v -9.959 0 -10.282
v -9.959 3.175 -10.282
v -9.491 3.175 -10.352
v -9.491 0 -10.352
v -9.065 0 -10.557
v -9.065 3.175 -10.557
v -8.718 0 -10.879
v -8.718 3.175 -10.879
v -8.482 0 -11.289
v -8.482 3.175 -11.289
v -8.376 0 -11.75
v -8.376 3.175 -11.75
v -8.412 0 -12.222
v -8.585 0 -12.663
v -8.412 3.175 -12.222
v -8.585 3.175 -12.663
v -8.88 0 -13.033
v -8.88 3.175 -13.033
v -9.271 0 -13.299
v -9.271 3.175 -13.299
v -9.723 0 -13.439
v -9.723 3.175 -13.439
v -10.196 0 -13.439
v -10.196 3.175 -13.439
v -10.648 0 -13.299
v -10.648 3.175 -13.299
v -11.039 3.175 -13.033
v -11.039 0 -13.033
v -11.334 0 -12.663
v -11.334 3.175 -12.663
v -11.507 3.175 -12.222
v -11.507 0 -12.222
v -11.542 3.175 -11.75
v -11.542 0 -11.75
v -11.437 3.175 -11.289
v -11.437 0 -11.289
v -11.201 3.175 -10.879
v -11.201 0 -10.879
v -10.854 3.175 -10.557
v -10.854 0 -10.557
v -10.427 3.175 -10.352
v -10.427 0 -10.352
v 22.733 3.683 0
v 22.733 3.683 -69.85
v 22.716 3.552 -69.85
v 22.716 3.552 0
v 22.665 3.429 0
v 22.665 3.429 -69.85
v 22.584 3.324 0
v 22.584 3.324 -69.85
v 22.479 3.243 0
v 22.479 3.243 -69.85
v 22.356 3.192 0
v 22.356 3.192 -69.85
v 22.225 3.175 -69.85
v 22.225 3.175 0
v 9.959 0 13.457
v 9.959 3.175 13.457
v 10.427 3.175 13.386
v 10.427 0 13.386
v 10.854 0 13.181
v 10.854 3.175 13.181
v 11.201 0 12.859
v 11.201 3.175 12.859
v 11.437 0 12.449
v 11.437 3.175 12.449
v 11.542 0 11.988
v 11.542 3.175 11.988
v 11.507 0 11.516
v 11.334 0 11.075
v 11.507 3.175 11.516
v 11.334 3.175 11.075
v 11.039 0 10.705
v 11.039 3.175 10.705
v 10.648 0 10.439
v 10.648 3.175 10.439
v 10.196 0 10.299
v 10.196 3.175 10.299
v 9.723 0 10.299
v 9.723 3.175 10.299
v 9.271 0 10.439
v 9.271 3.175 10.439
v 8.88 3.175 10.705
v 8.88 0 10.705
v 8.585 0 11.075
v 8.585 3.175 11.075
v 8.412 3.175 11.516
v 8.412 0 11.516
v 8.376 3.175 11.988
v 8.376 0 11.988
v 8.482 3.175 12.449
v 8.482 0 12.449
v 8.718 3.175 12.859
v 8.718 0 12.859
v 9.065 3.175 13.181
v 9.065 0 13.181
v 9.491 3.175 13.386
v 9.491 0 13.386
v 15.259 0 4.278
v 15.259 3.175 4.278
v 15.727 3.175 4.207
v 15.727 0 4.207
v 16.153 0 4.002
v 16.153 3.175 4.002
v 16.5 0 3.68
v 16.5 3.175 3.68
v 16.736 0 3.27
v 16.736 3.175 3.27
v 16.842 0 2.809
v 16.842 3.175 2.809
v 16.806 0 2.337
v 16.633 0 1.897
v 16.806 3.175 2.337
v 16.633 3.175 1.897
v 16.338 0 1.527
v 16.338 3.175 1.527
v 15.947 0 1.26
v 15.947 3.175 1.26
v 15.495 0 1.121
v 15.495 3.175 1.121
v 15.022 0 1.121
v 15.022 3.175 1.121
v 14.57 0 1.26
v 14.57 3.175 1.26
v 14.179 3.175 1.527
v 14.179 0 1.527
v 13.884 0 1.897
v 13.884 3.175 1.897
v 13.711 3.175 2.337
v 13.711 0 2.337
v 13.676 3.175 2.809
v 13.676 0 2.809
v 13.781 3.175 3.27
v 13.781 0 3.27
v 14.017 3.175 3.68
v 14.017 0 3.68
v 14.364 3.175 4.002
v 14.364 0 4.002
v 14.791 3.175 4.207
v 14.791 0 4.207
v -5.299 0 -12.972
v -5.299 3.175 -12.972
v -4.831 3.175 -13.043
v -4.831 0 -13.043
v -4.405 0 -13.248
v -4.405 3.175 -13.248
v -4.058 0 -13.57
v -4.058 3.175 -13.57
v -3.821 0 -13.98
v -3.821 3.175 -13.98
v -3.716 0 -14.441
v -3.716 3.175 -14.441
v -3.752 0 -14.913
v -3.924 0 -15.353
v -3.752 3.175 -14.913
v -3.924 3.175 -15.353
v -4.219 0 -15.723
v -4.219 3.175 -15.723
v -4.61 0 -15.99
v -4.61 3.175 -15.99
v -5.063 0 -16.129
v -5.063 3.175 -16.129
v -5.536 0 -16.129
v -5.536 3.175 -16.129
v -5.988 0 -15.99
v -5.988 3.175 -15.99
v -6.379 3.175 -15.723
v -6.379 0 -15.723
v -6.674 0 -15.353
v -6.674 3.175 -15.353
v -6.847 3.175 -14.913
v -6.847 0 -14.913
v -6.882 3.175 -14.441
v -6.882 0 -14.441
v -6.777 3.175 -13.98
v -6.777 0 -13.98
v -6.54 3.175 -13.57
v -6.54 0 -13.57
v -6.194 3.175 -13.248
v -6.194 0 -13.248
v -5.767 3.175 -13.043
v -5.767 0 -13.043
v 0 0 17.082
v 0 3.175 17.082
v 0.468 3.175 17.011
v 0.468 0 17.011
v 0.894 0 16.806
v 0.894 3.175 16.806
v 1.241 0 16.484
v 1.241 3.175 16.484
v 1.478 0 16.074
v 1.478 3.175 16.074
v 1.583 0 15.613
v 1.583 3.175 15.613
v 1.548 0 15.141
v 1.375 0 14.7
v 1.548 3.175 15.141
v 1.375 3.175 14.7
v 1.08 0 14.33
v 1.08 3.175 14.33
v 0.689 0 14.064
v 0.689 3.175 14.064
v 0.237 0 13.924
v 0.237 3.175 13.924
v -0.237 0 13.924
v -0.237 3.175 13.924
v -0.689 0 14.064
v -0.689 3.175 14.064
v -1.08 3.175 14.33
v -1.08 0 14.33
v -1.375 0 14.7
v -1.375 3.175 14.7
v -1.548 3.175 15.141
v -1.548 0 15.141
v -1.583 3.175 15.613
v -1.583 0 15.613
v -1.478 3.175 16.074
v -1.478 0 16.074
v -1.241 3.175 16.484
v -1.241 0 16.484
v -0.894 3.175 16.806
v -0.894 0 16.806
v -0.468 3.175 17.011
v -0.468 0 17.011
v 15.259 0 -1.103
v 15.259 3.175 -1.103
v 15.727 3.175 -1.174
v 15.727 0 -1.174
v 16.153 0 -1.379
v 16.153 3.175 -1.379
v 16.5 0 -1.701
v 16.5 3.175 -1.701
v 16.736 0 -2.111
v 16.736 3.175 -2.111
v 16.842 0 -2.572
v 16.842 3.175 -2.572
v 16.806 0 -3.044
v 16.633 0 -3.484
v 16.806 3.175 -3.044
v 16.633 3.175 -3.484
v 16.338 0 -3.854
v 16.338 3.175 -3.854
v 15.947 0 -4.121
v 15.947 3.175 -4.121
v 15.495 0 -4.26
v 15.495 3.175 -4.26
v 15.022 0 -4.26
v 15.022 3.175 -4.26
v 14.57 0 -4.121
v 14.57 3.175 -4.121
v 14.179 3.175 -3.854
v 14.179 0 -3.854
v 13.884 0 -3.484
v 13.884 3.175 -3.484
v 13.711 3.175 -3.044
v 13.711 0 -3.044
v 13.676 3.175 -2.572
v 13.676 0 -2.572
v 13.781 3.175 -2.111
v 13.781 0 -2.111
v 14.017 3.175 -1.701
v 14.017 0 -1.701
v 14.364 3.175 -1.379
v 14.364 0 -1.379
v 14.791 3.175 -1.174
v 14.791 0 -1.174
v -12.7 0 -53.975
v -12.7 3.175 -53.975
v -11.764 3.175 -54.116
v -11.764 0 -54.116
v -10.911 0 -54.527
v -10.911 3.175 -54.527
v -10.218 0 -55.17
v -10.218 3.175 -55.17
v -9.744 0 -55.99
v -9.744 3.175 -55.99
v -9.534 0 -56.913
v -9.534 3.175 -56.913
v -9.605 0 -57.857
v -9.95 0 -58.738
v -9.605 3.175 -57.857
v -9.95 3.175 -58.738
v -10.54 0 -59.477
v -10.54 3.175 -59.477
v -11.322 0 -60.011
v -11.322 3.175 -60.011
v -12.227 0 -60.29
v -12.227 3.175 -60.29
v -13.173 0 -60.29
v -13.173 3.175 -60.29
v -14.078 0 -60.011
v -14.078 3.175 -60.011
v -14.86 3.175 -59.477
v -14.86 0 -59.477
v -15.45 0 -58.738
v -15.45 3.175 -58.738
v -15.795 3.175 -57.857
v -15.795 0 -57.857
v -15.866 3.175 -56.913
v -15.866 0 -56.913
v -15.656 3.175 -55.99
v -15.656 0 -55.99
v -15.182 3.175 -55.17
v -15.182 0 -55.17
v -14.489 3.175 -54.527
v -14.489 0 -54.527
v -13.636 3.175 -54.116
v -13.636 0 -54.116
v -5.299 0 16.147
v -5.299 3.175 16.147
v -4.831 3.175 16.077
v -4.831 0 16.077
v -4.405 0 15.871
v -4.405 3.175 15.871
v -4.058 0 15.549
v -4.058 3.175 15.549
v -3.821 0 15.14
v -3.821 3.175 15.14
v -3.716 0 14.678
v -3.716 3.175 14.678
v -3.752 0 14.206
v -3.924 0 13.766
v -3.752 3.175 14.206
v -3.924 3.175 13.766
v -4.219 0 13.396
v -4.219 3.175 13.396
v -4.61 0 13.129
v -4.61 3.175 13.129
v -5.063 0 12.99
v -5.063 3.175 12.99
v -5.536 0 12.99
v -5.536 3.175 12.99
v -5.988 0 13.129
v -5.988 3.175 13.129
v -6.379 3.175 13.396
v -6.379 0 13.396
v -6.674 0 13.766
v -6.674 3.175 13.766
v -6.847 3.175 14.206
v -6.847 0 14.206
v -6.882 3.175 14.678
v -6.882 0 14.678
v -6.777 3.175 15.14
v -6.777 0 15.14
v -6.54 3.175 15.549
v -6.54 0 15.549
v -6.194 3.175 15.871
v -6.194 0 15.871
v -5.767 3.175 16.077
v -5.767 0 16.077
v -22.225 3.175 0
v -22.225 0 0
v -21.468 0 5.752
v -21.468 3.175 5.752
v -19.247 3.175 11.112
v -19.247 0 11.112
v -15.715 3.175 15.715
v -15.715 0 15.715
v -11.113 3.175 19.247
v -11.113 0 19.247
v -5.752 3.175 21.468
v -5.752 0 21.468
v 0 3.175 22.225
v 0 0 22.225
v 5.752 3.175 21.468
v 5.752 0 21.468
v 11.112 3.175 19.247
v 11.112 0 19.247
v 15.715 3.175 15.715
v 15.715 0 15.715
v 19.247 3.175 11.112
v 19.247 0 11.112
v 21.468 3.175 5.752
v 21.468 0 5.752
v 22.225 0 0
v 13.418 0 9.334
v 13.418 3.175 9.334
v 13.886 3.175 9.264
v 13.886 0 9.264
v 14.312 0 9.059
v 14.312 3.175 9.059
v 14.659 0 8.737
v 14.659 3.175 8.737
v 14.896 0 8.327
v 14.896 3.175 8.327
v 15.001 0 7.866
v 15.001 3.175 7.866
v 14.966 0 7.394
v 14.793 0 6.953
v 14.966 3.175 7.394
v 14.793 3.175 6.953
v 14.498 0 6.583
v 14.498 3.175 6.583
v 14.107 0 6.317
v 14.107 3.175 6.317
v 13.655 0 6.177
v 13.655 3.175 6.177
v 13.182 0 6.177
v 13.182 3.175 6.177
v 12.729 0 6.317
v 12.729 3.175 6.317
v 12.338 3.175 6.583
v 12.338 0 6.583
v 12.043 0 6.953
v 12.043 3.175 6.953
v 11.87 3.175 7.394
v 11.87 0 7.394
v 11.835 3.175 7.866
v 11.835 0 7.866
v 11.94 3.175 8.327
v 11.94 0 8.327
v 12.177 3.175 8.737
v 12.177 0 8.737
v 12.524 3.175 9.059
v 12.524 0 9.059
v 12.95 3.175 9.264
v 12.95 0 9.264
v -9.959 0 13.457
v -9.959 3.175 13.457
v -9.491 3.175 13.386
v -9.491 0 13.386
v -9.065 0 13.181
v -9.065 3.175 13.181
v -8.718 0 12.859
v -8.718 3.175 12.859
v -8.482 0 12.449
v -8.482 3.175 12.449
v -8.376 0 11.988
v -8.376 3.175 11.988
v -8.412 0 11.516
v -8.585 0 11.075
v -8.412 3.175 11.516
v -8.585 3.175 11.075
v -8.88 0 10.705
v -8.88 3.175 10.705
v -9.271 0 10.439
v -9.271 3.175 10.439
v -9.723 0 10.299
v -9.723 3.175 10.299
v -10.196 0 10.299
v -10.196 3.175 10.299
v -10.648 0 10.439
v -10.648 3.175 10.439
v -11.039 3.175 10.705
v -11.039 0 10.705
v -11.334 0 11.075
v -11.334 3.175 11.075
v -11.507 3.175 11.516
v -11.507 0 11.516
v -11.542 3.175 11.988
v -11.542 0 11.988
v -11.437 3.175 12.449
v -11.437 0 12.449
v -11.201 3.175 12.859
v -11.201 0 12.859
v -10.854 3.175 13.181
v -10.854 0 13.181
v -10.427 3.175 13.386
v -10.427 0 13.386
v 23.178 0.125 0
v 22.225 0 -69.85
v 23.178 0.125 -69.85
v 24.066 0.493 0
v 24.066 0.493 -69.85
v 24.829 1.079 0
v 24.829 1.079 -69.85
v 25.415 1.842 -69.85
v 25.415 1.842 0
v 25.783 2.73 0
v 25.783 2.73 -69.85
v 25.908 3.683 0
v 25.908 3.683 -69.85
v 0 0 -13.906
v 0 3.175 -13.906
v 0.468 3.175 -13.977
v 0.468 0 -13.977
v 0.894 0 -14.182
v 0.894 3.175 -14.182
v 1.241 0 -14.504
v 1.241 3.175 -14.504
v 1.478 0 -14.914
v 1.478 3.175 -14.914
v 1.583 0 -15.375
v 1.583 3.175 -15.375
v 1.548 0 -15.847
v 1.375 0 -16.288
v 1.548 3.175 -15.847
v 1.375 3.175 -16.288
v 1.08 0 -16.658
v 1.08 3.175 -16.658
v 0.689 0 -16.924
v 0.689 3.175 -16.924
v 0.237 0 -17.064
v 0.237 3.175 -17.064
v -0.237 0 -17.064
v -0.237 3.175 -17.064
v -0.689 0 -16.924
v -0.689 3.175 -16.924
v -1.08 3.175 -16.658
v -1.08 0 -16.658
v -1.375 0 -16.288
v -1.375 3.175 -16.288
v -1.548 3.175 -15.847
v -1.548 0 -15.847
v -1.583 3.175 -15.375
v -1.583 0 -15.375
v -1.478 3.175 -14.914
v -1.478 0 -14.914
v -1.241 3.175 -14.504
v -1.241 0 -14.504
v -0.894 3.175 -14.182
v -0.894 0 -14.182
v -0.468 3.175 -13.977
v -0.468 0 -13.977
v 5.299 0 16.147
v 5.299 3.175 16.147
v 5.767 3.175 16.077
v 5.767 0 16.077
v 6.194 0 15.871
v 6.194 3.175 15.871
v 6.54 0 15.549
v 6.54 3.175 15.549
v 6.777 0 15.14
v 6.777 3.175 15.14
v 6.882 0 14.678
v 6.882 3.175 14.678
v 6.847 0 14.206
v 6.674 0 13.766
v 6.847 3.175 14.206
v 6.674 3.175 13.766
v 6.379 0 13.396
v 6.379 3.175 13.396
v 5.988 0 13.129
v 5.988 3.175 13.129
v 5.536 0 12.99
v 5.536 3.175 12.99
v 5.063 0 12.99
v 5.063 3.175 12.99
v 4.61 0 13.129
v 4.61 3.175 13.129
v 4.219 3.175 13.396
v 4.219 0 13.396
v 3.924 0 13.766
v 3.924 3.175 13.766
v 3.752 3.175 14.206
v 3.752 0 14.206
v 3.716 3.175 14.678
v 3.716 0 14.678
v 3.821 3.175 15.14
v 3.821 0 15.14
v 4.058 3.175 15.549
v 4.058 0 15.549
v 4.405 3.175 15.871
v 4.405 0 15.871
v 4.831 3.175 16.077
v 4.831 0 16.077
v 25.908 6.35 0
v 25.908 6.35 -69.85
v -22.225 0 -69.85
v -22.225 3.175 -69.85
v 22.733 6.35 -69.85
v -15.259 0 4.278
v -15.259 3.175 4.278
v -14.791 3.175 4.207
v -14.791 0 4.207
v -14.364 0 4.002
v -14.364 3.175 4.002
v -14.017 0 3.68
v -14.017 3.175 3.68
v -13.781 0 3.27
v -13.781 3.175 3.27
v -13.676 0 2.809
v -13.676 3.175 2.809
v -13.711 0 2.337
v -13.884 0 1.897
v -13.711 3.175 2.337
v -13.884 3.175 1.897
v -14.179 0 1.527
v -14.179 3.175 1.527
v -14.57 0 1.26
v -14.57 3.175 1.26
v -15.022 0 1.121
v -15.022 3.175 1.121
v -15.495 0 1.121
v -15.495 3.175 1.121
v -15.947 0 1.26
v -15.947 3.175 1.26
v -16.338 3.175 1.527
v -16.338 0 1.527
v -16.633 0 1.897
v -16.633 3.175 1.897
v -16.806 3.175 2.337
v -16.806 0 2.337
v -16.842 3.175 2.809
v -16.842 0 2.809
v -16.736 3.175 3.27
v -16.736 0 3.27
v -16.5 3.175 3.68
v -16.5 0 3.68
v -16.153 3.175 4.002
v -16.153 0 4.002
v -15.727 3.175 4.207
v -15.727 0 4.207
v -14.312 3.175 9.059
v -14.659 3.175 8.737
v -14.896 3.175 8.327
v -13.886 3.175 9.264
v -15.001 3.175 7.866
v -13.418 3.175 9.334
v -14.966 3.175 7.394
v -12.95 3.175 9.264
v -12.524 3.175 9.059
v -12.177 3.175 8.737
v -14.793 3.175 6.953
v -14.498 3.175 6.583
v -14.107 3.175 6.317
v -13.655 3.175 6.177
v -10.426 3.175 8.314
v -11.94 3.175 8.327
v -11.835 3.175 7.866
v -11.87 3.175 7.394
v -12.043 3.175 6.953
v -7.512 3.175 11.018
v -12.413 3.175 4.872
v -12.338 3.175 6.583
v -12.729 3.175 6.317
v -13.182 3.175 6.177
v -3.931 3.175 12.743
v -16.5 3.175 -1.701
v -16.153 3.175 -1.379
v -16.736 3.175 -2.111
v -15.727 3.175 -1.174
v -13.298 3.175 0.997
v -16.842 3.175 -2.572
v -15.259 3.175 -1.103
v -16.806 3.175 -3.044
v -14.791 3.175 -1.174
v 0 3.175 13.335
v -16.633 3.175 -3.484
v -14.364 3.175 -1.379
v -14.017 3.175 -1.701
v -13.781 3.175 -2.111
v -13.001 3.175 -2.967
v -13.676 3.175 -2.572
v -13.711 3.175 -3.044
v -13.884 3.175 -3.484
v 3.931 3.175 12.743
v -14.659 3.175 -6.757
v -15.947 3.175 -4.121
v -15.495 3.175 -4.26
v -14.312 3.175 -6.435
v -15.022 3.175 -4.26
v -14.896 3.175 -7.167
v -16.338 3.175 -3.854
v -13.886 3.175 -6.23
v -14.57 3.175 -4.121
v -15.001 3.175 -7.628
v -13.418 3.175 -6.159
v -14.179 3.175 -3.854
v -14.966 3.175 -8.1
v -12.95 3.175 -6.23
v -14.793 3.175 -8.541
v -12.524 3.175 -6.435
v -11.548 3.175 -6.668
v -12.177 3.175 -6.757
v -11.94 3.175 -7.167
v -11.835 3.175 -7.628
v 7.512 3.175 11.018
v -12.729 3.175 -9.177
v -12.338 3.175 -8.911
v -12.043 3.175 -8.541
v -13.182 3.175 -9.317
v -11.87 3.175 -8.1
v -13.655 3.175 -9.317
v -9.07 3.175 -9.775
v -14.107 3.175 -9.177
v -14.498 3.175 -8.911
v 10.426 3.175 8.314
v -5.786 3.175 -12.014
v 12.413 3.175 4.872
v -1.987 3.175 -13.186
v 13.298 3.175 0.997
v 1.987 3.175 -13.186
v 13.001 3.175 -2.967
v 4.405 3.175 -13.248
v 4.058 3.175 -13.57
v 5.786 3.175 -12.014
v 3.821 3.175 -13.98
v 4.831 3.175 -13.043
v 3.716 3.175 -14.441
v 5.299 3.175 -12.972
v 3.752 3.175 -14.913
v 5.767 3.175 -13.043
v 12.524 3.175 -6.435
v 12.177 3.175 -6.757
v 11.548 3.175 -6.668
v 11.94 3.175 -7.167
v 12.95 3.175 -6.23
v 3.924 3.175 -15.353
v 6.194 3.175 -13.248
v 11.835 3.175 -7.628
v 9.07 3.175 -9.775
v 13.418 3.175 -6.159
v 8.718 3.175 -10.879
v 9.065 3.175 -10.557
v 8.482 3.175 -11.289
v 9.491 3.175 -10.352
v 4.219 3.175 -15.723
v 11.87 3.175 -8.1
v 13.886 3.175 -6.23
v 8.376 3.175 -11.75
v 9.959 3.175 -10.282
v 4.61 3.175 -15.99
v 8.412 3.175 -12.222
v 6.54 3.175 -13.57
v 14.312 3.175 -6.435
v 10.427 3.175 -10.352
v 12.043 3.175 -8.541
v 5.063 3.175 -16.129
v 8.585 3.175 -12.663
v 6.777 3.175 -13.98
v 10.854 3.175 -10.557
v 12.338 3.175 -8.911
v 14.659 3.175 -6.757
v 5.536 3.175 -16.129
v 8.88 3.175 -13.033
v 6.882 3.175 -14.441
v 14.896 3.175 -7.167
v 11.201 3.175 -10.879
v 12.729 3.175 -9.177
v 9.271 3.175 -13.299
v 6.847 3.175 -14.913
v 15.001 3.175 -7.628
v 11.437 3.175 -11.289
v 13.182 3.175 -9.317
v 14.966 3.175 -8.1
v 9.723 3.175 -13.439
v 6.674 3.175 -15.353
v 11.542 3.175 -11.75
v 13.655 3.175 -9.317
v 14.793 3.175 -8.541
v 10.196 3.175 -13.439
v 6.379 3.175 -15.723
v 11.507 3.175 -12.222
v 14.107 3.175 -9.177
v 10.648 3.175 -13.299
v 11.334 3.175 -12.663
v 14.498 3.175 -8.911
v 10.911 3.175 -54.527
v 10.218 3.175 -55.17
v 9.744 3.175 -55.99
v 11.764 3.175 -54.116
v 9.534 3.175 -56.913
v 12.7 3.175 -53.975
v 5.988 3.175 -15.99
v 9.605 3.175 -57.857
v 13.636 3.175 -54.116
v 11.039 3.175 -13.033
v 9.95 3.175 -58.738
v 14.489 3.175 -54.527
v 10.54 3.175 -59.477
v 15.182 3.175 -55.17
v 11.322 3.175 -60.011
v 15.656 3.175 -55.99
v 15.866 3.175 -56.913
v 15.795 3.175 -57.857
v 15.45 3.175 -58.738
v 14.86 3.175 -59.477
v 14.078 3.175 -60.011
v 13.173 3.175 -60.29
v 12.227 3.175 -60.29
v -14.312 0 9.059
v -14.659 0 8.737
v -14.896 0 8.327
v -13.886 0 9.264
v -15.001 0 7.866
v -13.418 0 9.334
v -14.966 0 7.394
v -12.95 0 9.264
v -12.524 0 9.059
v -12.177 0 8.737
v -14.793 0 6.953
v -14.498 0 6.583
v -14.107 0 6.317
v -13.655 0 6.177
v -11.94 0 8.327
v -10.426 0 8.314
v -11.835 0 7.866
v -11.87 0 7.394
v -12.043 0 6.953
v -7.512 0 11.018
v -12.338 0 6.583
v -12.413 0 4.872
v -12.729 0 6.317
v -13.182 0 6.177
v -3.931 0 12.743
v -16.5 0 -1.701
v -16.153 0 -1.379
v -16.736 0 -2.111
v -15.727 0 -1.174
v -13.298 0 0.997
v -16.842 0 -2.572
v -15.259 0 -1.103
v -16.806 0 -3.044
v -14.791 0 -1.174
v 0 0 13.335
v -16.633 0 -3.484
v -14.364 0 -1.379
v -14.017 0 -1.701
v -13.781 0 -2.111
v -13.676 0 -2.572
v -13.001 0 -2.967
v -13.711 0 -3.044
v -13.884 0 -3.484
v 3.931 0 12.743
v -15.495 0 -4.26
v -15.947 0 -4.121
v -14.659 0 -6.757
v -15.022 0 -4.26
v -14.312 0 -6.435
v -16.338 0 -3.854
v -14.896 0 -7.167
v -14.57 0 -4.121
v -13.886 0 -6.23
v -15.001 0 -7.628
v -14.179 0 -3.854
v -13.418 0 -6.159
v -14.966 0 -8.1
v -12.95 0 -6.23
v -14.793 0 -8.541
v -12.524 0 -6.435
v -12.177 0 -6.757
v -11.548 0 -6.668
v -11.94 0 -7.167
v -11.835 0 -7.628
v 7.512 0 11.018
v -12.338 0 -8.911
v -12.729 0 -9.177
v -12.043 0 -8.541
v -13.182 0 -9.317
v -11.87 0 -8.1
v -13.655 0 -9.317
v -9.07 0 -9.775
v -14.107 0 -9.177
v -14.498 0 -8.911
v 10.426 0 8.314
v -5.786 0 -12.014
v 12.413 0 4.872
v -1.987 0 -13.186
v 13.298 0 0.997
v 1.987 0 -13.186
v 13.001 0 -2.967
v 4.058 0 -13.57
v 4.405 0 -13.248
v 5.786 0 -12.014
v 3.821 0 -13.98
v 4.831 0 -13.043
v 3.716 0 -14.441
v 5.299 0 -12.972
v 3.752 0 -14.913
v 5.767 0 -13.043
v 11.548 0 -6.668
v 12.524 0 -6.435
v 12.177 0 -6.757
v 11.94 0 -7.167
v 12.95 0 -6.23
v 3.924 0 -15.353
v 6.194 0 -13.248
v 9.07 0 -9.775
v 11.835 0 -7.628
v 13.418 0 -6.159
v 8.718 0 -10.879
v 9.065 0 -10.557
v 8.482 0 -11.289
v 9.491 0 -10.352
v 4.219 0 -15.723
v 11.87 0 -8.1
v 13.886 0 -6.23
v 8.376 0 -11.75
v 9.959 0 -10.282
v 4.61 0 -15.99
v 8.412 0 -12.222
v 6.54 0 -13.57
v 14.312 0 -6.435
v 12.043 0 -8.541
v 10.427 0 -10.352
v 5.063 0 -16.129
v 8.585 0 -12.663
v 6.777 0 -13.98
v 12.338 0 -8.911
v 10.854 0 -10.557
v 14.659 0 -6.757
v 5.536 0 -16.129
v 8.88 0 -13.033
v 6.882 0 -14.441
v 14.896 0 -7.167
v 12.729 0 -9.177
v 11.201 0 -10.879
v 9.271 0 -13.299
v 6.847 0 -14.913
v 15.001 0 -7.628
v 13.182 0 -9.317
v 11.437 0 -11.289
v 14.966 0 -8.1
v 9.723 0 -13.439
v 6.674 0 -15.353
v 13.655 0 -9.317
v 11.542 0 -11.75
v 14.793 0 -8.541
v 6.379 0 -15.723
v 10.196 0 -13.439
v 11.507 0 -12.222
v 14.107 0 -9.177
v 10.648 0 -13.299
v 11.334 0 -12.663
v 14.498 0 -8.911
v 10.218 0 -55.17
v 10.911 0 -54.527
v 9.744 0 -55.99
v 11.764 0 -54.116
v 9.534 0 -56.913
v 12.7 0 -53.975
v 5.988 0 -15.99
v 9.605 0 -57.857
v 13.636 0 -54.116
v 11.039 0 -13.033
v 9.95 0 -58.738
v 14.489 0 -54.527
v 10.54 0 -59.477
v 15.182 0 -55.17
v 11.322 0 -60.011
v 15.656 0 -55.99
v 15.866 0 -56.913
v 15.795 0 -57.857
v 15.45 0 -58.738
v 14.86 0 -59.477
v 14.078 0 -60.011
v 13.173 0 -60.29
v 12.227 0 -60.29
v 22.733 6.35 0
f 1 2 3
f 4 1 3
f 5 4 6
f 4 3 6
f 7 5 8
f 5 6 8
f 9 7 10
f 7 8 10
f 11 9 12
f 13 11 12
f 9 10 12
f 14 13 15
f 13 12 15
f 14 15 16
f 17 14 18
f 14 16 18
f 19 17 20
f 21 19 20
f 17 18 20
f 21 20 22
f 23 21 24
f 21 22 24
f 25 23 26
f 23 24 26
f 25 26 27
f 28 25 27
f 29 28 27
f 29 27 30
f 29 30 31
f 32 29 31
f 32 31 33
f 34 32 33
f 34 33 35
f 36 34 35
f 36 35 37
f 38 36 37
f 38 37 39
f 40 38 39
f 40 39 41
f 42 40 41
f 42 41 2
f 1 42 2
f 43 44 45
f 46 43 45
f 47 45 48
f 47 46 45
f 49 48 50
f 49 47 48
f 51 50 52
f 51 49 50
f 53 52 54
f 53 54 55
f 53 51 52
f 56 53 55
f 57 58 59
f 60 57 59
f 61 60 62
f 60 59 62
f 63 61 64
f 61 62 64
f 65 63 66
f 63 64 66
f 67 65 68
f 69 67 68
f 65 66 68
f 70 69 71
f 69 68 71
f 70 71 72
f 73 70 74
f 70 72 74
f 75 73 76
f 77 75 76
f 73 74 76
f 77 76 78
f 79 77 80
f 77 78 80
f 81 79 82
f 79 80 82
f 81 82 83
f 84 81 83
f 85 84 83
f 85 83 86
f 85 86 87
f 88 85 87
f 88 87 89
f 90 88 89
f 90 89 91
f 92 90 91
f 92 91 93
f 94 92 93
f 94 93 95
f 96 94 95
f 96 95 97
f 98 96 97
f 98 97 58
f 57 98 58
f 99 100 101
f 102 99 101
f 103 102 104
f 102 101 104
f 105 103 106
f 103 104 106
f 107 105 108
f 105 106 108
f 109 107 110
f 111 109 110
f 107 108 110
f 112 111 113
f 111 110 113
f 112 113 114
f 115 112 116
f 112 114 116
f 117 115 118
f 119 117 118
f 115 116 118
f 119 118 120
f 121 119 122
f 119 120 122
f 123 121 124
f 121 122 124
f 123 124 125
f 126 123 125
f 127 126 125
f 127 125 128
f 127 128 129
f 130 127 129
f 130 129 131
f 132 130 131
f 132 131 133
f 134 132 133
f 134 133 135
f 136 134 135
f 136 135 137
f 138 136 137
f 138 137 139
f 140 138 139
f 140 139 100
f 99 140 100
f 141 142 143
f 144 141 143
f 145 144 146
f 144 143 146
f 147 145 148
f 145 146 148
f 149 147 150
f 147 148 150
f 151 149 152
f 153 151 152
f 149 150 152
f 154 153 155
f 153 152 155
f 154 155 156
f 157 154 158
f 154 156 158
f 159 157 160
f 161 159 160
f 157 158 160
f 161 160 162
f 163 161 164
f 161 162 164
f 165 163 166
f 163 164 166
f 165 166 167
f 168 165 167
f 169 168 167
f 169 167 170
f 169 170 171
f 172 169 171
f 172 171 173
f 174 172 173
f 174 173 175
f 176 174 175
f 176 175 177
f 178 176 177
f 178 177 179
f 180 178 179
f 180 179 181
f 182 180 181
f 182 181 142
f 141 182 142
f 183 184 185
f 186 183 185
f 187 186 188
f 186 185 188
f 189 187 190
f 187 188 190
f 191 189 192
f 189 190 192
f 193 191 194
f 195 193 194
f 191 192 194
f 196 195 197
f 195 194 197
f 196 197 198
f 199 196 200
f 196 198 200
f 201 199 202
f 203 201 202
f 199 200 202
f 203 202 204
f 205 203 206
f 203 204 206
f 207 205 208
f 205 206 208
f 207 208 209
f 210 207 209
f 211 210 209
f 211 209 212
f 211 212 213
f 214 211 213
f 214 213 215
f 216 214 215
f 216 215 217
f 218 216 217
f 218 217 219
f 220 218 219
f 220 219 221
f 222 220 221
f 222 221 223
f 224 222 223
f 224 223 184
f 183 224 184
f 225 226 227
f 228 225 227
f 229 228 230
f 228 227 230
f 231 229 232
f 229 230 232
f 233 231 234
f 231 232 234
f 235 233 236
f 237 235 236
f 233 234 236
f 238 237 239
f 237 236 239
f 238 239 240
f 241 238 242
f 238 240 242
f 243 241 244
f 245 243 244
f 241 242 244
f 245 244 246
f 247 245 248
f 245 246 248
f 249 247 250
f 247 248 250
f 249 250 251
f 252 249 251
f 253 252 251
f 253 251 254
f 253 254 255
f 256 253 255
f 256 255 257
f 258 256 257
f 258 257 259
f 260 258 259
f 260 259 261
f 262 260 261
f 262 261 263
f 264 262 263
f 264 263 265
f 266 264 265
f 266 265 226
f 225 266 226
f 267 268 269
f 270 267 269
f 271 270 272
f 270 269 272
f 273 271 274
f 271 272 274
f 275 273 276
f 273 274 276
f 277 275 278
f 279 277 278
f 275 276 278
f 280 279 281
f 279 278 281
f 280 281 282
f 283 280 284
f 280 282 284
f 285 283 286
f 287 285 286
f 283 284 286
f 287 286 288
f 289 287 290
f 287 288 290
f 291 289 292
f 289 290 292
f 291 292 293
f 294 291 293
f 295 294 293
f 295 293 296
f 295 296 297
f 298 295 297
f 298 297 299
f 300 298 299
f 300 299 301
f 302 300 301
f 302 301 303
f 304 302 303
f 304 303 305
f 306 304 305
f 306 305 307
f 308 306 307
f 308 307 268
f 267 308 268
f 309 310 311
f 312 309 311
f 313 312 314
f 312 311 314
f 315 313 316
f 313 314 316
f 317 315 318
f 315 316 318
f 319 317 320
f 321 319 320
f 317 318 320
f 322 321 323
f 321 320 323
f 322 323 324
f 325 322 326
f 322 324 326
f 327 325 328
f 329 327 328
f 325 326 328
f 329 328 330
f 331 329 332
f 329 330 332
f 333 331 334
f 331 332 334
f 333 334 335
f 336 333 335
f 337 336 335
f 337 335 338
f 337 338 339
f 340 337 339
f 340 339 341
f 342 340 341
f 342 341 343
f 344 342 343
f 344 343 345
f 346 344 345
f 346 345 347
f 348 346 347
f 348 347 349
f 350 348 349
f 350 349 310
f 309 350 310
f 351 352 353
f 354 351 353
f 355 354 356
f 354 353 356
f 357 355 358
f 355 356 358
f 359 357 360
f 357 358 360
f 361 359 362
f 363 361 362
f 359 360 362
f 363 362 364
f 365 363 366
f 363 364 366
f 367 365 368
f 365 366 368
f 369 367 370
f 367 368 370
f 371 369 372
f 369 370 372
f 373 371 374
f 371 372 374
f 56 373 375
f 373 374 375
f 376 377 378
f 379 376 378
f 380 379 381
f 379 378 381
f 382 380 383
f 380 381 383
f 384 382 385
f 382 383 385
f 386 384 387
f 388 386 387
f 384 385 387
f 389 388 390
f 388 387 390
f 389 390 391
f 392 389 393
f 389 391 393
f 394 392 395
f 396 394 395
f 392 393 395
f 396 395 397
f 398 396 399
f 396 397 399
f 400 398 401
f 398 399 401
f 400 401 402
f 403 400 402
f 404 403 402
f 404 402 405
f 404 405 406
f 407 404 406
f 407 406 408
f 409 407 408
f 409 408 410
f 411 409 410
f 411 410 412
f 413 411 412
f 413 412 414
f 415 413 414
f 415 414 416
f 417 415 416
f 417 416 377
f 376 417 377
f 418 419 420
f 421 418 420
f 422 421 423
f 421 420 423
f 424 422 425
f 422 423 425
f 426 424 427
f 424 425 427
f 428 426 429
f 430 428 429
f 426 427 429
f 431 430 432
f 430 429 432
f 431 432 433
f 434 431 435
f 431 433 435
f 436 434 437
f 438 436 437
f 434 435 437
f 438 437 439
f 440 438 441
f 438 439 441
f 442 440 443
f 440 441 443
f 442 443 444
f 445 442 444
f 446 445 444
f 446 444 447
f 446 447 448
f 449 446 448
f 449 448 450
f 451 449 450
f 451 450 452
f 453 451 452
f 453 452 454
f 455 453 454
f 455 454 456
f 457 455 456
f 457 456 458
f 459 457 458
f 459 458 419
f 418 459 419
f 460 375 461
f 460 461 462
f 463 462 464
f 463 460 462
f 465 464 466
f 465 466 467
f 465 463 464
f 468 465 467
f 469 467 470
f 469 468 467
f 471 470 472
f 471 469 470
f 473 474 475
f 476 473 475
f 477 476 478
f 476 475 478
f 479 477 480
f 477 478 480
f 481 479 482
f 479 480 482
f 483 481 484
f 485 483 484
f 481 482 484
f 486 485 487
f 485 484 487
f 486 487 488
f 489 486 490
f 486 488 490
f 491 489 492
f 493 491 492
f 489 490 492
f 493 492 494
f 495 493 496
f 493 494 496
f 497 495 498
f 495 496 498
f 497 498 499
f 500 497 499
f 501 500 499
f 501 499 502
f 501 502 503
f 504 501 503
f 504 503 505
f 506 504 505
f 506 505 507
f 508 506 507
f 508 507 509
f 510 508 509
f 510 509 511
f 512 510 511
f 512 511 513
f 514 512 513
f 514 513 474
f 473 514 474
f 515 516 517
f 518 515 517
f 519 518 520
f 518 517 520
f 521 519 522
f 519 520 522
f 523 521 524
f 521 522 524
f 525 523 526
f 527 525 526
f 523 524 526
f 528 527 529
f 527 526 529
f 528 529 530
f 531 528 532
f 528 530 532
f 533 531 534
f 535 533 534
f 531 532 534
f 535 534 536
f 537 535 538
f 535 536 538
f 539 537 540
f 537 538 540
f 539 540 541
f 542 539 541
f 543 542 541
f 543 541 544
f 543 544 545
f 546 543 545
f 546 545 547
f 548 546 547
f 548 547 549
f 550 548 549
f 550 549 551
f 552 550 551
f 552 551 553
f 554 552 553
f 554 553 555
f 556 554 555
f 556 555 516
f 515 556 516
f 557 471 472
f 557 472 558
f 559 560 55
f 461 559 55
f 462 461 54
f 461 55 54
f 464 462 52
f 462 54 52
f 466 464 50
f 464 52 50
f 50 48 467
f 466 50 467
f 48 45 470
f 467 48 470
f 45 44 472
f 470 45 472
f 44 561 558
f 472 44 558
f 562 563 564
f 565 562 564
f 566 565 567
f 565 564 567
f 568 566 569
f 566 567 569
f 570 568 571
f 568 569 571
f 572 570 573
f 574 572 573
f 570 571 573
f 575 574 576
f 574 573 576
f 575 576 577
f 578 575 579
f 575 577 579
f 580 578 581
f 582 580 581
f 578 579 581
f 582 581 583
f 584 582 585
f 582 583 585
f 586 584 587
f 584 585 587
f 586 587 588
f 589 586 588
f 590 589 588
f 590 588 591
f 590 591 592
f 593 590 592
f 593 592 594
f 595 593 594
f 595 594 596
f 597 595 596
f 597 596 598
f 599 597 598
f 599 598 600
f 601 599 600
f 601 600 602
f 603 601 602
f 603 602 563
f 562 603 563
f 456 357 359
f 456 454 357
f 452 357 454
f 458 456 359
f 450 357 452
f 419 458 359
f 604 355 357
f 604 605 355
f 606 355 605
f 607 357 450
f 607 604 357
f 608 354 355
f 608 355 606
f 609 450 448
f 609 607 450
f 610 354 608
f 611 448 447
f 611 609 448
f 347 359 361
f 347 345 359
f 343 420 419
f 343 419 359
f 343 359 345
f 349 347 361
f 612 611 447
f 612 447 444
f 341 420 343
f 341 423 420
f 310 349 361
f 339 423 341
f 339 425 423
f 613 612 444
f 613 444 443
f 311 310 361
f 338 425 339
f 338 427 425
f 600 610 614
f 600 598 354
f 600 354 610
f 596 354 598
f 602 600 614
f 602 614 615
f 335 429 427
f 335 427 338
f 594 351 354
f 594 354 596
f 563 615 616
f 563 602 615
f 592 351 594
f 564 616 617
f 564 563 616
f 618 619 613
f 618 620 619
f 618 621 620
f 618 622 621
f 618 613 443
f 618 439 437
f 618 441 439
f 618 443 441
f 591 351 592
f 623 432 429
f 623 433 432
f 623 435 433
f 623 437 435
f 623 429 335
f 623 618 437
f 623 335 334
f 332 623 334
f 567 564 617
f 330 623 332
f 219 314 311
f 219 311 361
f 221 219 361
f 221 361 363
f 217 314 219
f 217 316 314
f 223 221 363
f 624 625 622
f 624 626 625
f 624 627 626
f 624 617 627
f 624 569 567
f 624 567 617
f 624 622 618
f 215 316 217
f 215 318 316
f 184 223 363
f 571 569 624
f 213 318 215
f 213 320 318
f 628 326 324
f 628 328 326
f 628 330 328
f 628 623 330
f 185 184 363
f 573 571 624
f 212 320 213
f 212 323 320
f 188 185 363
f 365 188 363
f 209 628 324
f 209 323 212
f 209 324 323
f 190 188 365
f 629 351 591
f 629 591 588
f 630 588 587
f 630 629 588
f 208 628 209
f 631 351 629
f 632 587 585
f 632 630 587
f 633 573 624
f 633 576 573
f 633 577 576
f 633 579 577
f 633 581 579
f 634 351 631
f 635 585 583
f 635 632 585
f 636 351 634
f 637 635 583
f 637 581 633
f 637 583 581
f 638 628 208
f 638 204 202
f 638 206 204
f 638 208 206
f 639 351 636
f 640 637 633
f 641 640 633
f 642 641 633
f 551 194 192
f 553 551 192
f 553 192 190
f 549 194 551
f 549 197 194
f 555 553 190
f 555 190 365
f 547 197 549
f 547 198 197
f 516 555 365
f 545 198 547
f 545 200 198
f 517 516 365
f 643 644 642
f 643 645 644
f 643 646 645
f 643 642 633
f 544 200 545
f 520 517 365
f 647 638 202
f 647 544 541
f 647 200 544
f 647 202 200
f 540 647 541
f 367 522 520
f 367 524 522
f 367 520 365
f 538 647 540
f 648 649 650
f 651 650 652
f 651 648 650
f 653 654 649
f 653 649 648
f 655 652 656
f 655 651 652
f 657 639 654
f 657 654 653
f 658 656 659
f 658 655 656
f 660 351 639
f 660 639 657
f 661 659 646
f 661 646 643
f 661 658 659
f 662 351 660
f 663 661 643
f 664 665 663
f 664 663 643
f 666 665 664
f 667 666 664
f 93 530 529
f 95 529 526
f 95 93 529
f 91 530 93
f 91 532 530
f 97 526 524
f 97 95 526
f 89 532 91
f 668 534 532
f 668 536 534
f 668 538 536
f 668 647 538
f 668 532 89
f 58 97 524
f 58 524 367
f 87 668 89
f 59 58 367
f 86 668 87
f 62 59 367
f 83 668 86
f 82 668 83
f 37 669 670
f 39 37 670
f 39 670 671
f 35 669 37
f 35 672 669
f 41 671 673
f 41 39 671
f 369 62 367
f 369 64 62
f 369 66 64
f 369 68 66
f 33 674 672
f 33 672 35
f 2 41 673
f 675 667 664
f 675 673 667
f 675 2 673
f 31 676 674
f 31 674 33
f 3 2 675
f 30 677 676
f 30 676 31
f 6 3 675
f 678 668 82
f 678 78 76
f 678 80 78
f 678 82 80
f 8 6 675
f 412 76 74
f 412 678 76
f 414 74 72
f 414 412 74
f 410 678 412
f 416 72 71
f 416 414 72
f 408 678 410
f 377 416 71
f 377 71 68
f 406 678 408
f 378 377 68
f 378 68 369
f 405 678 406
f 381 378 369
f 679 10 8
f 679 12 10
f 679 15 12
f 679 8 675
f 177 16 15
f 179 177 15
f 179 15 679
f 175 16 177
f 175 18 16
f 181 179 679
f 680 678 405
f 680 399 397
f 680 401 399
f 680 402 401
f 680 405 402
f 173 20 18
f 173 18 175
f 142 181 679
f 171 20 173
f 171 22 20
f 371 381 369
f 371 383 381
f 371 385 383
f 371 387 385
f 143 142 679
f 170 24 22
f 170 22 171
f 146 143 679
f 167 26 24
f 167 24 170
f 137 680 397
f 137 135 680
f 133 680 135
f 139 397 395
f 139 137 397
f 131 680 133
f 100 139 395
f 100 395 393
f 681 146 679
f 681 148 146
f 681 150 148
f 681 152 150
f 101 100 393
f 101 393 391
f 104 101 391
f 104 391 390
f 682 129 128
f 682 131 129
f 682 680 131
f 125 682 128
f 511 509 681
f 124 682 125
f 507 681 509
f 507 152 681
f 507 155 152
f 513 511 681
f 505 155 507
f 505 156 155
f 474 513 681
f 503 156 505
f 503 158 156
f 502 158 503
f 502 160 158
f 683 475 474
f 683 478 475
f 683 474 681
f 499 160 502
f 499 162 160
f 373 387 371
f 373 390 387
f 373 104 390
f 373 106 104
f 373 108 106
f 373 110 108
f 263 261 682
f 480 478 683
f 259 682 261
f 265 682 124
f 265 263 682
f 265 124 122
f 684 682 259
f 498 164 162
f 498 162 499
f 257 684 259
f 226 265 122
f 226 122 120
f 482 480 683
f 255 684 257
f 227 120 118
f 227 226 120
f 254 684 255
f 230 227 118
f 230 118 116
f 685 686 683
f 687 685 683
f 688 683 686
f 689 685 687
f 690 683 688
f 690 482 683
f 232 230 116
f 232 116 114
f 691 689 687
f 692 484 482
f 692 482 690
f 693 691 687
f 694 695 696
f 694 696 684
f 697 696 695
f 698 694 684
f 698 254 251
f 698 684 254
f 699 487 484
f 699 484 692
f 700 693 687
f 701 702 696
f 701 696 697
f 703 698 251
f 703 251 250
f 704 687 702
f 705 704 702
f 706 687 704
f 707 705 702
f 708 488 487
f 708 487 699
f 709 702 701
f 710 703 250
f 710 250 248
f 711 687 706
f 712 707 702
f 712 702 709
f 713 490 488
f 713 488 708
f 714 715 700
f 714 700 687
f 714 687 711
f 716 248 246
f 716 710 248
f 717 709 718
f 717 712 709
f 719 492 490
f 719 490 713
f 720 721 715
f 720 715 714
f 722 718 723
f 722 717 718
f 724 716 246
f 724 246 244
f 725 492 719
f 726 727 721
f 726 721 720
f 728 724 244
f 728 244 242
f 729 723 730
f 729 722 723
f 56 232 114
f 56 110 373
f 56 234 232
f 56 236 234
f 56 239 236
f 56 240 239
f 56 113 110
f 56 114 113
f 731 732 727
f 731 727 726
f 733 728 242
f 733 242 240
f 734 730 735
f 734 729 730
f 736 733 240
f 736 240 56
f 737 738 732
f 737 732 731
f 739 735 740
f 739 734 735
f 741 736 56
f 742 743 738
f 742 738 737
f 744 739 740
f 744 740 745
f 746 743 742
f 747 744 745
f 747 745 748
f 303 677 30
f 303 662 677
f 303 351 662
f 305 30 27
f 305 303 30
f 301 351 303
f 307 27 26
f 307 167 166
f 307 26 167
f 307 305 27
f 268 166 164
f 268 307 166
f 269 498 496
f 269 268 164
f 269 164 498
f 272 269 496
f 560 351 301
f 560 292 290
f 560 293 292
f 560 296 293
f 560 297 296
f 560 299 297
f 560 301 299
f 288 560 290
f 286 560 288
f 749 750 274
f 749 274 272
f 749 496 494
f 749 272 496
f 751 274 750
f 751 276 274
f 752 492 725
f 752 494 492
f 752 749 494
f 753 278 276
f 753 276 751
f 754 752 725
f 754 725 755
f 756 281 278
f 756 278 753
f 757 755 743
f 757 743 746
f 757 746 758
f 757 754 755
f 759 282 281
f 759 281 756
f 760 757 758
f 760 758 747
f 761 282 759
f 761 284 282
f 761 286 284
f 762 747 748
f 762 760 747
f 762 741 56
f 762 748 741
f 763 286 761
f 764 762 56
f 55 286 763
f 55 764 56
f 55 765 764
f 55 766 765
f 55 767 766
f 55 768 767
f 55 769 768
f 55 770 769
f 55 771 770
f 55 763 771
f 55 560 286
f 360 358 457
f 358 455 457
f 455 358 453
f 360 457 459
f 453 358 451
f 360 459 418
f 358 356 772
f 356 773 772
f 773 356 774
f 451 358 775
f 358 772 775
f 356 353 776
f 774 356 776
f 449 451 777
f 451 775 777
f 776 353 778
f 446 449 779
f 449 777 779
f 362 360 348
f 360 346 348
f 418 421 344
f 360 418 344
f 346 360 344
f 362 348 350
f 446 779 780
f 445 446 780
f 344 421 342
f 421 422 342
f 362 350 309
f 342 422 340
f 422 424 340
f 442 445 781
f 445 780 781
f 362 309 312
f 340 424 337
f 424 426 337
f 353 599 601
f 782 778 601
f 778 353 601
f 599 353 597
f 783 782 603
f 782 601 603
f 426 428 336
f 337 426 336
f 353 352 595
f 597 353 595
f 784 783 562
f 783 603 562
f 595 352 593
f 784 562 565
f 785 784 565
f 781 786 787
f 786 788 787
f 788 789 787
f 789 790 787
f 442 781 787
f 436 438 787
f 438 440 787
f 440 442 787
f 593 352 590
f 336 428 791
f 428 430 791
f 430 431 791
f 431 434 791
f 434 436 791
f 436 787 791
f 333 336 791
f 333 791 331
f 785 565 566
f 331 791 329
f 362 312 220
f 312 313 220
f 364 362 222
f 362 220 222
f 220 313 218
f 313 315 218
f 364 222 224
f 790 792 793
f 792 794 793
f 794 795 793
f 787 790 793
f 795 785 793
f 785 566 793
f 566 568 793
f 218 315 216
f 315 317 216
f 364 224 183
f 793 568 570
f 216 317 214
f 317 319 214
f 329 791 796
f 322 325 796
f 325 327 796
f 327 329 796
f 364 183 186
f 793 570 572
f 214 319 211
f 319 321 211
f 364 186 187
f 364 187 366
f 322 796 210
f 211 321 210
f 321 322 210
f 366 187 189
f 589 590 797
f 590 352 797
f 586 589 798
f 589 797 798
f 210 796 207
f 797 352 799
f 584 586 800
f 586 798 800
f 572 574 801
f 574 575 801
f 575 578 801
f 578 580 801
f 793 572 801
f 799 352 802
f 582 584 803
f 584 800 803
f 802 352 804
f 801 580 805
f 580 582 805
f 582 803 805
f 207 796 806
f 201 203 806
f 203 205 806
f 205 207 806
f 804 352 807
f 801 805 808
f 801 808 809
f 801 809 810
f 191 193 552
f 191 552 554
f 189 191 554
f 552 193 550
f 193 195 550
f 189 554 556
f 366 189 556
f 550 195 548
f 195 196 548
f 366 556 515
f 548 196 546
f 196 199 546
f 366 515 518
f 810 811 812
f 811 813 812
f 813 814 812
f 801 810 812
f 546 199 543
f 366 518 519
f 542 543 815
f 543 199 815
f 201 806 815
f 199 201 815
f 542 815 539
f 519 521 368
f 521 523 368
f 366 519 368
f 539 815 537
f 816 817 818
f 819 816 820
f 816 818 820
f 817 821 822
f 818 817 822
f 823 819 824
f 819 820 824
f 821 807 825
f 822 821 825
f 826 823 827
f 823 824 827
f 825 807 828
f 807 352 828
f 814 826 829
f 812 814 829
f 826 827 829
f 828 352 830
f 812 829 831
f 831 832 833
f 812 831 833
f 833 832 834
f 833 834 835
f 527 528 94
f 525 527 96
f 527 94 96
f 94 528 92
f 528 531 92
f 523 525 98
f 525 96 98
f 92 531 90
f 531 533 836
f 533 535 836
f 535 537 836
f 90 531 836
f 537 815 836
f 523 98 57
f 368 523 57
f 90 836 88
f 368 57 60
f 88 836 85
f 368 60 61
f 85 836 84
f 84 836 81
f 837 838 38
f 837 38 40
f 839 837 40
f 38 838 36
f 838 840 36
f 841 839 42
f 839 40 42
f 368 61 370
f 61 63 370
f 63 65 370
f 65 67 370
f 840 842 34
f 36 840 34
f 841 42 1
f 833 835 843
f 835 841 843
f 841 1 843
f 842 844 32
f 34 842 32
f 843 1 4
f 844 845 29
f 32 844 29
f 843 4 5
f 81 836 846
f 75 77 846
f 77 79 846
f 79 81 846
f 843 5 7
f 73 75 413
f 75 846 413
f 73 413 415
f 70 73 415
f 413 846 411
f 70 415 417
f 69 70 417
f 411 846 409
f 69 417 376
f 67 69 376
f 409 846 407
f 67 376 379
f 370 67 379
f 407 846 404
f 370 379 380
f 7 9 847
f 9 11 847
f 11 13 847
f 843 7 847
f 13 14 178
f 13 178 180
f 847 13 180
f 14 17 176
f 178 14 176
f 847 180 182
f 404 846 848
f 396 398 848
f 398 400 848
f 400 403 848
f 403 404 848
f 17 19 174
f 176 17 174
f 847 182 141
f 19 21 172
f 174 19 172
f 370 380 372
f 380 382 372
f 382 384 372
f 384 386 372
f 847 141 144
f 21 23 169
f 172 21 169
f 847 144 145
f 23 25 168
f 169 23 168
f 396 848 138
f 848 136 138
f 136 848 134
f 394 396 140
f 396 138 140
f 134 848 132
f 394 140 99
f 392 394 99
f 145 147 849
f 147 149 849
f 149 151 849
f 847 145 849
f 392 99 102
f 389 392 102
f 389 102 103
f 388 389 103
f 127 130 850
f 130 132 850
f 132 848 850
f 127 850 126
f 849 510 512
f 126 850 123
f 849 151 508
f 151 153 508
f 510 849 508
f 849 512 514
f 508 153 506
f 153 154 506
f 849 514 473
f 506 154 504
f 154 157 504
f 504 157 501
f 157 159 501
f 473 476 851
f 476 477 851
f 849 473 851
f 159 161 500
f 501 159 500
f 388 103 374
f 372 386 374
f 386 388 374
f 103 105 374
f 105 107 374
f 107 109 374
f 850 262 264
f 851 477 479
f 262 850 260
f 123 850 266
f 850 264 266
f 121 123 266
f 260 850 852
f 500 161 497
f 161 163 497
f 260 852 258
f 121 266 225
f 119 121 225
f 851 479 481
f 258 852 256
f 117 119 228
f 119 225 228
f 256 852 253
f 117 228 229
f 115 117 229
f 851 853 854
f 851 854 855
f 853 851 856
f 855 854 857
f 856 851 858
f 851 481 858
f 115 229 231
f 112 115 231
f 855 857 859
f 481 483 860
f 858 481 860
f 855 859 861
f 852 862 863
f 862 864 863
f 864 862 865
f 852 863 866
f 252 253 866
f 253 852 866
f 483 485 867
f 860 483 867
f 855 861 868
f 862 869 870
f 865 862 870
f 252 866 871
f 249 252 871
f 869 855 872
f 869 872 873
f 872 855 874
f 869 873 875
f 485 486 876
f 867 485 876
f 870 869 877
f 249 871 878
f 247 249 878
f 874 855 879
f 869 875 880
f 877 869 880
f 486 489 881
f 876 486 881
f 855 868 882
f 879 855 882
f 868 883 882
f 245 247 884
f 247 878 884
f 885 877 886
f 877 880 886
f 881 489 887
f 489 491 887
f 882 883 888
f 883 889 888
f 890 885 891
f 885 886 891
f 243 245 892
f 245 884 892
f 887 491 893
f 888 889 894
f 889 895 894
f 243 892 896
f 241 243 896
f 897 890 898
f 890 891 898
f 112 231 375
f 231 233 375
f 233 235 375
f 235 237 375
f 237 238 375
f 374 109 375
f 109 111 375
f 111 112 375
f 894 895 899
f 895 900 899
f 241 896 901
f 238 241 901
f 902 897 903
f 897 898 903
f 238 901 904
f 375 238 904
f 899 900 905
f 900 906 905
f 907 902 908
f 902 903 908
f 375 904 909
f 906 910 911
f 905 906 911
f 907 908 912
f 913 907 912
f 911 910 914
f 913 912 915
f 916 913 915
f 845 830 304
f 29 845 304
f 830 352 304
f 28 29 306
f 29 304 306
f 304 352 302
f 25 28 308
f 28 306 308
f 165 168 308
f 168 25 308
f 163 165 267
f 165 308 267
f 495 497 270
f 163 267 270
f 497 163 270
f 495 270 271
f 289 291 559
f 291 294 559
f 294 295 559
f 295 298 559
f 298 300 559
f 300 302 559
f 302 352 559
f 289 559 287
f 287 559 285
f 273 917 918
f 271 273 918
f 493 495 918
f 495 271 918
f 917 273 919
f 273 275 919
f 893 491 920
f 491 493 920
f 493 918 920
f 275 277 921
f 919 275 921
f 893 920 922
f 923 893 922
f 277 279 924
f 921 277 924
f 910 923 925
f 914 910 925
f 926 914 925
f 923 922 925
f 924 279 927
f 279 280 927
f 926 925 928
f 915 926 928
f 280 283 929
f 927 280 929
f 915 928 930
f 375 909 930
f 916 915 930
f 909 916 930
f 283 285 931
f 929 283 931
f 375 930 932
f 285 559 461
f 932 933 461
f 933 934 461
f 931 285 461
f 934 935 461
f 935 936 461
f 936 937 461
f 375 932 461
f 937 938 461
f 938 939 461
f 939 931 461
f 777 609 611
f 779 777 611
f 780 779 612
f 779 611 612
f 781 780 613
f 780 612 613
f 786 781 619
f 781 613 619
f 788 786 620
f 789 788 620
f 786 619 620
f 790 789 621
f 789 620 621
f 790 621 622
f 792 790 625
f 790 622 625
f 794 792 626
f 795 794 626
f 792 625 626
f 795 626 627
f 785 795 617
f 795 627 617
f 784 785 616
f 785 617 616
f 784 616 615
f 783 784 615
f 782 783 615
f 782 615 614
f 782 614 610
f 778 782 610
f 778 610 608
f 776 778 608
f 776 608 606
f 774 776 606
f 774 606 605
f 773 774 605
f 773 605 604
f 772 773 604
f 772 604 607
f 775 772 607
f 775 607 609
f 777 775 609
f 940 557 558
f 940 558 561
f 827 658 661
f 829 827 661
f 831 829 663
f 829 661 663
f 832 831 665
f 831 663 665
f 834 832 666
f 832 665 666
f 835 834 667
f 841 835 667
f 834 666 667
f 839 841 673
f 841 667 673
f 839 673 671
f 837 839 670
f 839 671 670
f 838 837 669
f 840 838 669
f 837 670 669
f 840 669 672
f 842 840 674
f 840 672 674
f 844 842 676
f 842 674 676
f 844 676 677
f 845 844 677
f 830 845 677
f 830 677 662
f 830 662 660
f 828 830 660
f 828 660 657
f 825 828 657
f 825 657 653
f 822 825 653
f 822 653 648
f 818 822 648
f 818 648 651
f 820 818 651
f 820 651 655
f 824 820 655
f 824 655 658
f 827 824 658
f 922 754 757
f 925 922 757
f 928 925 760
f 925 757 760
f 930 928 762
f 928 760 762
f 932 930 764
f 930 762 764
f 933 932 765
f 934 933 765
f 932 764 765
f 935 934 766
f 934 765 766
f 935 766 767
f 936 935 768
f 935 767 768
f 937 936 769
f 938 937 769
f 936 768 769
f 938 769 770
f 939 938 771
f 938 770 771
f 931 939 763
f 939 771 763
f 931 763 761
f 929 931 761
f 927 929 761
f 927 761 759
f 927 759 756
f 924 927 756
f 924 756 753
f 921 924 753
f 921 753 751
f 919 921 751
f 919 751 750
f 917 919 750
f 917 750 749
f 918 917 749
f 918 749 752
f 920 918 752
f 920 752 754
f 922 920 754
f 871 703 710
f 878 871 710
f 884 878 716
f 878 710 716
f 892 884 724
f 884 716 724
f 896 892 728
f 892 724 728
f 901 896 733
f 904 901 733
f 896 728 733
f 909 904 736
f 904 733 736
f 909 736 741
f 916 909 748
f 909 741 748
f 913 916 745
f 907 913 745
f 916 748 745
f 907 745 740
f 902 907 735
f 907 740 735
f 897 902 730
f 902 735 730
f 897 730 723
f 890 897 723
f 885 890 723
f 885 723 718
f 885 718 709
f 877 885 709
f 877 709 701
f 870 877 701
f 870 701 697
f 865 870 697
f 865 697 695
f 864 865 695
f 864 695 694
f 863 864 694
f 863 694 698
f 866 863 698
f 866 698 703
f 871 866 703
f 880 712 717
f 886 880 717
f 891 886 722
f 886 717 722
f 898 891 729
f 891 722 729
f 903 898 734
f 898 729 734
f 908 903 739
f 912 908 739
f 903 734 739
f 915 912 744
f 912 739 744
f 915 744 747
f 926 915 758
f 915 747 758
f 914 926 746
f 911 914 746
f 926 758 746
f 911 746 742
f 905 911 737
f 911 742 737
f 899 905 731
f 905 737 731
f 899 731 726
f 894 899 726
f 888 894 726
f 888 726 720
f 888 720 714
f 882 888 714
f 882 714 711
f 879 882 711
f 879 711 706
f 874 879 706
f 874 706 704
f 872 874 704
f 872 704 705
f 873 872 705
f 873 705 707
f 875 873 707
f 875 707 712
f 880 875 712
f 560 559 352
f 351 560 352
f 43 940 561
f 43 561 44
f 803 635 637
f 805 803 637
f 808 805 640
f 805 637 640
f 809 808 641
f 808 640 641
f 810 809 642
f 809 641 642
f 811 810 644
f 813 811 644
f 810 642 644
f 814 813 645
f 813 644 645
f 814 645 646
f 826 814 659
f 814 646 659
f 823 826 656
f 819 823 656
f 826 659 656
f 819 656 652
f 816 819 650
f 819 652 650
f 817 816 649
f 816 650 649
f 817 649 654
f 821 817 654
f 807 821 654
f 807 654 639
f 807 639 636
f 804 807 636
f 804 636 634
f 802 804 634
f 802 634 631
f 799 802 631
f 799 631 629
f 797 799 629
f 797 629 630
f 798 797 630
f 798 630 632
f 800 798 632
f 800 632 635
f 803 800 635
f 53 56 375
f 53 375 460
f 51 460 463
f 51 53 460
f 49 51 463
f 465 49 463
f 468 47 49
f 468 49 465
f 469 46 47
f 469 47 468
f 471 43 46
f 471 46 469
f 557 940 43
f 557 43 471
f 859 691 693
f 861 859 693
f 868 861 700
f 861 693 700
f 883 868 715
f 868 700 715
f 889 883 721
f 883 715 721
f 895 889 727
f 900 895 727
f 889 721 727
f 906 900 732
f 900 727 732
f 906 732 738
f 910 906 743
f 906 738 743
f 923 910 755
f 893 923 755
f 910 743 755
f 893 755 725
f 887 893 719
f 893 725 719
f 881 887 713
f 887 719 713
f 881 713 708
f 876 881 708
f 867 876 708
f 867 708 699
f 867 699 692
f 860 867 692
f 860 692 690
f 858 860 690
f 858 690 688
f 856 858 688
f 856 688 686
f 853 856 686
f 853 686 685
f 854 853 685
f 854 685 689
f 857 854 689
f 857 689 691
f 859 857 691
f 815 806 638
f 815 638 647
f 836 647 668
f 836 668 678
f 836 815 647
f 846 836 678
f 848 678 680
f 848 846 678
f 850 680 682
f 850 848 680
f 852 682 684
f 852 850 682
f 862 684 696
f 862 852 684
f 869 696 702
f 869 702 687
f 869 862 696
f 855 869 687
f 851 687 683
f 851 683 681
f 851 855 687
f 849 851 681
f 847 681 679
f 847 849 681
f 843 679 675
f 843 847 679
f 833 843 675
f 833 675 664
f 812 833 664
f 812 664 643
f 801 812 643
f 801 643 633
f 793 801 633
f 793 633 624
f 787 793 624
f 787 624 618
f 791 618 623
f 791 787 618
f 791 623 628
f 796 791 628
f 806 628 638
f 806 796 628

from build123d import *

# Parameters (mm, degrees)
SKETCH1_R           = 13.335
BOSS_EXTRUDE1_DEPTH = 3.175
SKETCH2_R           = 3.175
SKETCH2_R_2         = 1.5875
CUT_EXTRUDE1_DEPTH  = 74.369297053
EDGE_FLANGE2_DEPTH  = 69.85


# Sheet-metal steps are written as plain solids
with BuildPart() as part:
    # Sketch1 → Boss-Extrude1 (new body)
    with BuildSketch(Plane(origin=(0, 0, 0), x_dir=(1, 0, 0), z_dir=(0, 1, 0))):
        with BuildLine():
            Line((22.225, 0), (22.225, 69.85))
            Line((22.225, 69.85), (-22.225, 69.85))
            Line((-22.225, 69.85), (-22.225, 0))
            ThreePointArc((-22.225, 0), (0, -22.225), (22.225, 0))
        make_face()
        with Locations(Location((0, 0, 0), (0, 0, 270))):
            Circle(SKETCH1_R, mode=Mode.SUBTRACT)
    extrude(amount=BOSS_EXTRUDE1_DEPTH)

    # Sketch2 → Cut-Extrude1 (cut, through all)
    with BuildSketch(Plane(origin=(0, 3.175, 0), x_dir=(1, 0, 0), z_dir=(0, 1, 0))):
        with Locations(Location((-12.7, 57.15, 0), (0, 0, 270))):
            Circle(SKETCH2_R)
        with Locations(Location((12.7, 57.15, 0), (0, 0, 270))):
            Circle(SKETCH2_R)
        with Locations(Location((0, 15.494, 0), (0, 0, 270))):
            Circle(SKETCH2_R_2)
        with Locations(Location((5.299260101, 14.559597466, 0), (0, 0, 270))):
            Circle(SKETCH2_R_2)
        with Locations(Location((9.959351224, 11.869092602, 0), (0, 0, 270))):
            Circle(SKETCH2_R_2)
        with Locations(Location((13.418197606, 7.747, 0), (0, 0, 270))):
            Circle(SKETCH2_R_2)
        with Locations(Location((15.258611325, 2.690504865, 0), (0, 0, 270))):
            Circle(SKETCH2_R_2)
        with Locations(Location((15.258611325, -2.690504865, 0), (0, 0, 270))):
            Circle(SKETCH2_R_2)
        with Locations(Location((13.418197606, -7.747, 0), (0, 0, 270))):
            Circle(SKETCH2_R_2)
        with Locations(Location((9.959351224, -11.869092602, 0), (0, 0, 270))):
            Circle(SKETCH2_R_2)
        with Locations(Location((5.299260101, -14.559597466, 0), (0, 0, 270))):
            Circle(SKETCH2_R_2)
        with Locations(Location((0, -15.494, 0), (0, 0, 270))):
            Circle(SKETCH2_R_2)
        with Locations(Location((-5.299260101, -14.559597466, 0), (0, 0, 270))):
            Circle(SKETCH2_R_2)
        with Locations(Location((-9.959351224, -11.869092602, 0), (0, 0, 270))):
            Circle(SKETCH2_R_2)
        with Locations(Location((-13.418197606, -7.747, 0), (0, 0, 270))):
            Circle(SKETCH2_R_2)
        with Locations(Location((-15.258611325, -2.690504865, 0), (0, 0, 270))):
            Circle(SKETCH2_R_2)
        with Locations(Location((-15.258611325, 2.690504865, 0), (0, 0, 270))):
            Circle(SKETCH2_R_2)
        with Locations(Location((-13.418197606, 7.747, 0), (0, 0, 270))):
            Circle(SKETCH2_R_2)
        with Locations(Location((-9.959351224, 11.869092602, 0), (0, 0, 270))):
            Circle(SKETCH2_R_2)
        with Locations(Location((-5.299260101, 14.559597466, 0), (0, 0, 270))):
            Circle(SKETCH2_R_2)
    extrude(amount=-CUT_EXTRUDE1_DEPTH, mode=Mode.SUBTRACT)

    # Edge-Flange2 section (across the edge) → Edge-Flange2 (add)
    with BuildSketch(Plane(origin=(22.733, 3.175, 0), x_dir=(-1, 0, 0), z_dir=(0, 0, -1))):
        with BuildLine():
            Line((-3.175, 0.508), (-3.175, 3.175))
            Line((-3.175, 3.175), (0, 3.175))
            Line((0, 3.175), (0, 0.508))
            ThreePointArc((0, 0.508), (0.148789755, 0.148789755), (0.508, 0))
            Line((0.508, 0), (0.508, -3.175))
            ThreePointArc((0.508, -3.175), (-2.096274275, -2.096274275), (-3.175, 0.508))
        make_face()
    extrude(amount=EDGE_FLANGE2_DEPTH)


solid = part.part
